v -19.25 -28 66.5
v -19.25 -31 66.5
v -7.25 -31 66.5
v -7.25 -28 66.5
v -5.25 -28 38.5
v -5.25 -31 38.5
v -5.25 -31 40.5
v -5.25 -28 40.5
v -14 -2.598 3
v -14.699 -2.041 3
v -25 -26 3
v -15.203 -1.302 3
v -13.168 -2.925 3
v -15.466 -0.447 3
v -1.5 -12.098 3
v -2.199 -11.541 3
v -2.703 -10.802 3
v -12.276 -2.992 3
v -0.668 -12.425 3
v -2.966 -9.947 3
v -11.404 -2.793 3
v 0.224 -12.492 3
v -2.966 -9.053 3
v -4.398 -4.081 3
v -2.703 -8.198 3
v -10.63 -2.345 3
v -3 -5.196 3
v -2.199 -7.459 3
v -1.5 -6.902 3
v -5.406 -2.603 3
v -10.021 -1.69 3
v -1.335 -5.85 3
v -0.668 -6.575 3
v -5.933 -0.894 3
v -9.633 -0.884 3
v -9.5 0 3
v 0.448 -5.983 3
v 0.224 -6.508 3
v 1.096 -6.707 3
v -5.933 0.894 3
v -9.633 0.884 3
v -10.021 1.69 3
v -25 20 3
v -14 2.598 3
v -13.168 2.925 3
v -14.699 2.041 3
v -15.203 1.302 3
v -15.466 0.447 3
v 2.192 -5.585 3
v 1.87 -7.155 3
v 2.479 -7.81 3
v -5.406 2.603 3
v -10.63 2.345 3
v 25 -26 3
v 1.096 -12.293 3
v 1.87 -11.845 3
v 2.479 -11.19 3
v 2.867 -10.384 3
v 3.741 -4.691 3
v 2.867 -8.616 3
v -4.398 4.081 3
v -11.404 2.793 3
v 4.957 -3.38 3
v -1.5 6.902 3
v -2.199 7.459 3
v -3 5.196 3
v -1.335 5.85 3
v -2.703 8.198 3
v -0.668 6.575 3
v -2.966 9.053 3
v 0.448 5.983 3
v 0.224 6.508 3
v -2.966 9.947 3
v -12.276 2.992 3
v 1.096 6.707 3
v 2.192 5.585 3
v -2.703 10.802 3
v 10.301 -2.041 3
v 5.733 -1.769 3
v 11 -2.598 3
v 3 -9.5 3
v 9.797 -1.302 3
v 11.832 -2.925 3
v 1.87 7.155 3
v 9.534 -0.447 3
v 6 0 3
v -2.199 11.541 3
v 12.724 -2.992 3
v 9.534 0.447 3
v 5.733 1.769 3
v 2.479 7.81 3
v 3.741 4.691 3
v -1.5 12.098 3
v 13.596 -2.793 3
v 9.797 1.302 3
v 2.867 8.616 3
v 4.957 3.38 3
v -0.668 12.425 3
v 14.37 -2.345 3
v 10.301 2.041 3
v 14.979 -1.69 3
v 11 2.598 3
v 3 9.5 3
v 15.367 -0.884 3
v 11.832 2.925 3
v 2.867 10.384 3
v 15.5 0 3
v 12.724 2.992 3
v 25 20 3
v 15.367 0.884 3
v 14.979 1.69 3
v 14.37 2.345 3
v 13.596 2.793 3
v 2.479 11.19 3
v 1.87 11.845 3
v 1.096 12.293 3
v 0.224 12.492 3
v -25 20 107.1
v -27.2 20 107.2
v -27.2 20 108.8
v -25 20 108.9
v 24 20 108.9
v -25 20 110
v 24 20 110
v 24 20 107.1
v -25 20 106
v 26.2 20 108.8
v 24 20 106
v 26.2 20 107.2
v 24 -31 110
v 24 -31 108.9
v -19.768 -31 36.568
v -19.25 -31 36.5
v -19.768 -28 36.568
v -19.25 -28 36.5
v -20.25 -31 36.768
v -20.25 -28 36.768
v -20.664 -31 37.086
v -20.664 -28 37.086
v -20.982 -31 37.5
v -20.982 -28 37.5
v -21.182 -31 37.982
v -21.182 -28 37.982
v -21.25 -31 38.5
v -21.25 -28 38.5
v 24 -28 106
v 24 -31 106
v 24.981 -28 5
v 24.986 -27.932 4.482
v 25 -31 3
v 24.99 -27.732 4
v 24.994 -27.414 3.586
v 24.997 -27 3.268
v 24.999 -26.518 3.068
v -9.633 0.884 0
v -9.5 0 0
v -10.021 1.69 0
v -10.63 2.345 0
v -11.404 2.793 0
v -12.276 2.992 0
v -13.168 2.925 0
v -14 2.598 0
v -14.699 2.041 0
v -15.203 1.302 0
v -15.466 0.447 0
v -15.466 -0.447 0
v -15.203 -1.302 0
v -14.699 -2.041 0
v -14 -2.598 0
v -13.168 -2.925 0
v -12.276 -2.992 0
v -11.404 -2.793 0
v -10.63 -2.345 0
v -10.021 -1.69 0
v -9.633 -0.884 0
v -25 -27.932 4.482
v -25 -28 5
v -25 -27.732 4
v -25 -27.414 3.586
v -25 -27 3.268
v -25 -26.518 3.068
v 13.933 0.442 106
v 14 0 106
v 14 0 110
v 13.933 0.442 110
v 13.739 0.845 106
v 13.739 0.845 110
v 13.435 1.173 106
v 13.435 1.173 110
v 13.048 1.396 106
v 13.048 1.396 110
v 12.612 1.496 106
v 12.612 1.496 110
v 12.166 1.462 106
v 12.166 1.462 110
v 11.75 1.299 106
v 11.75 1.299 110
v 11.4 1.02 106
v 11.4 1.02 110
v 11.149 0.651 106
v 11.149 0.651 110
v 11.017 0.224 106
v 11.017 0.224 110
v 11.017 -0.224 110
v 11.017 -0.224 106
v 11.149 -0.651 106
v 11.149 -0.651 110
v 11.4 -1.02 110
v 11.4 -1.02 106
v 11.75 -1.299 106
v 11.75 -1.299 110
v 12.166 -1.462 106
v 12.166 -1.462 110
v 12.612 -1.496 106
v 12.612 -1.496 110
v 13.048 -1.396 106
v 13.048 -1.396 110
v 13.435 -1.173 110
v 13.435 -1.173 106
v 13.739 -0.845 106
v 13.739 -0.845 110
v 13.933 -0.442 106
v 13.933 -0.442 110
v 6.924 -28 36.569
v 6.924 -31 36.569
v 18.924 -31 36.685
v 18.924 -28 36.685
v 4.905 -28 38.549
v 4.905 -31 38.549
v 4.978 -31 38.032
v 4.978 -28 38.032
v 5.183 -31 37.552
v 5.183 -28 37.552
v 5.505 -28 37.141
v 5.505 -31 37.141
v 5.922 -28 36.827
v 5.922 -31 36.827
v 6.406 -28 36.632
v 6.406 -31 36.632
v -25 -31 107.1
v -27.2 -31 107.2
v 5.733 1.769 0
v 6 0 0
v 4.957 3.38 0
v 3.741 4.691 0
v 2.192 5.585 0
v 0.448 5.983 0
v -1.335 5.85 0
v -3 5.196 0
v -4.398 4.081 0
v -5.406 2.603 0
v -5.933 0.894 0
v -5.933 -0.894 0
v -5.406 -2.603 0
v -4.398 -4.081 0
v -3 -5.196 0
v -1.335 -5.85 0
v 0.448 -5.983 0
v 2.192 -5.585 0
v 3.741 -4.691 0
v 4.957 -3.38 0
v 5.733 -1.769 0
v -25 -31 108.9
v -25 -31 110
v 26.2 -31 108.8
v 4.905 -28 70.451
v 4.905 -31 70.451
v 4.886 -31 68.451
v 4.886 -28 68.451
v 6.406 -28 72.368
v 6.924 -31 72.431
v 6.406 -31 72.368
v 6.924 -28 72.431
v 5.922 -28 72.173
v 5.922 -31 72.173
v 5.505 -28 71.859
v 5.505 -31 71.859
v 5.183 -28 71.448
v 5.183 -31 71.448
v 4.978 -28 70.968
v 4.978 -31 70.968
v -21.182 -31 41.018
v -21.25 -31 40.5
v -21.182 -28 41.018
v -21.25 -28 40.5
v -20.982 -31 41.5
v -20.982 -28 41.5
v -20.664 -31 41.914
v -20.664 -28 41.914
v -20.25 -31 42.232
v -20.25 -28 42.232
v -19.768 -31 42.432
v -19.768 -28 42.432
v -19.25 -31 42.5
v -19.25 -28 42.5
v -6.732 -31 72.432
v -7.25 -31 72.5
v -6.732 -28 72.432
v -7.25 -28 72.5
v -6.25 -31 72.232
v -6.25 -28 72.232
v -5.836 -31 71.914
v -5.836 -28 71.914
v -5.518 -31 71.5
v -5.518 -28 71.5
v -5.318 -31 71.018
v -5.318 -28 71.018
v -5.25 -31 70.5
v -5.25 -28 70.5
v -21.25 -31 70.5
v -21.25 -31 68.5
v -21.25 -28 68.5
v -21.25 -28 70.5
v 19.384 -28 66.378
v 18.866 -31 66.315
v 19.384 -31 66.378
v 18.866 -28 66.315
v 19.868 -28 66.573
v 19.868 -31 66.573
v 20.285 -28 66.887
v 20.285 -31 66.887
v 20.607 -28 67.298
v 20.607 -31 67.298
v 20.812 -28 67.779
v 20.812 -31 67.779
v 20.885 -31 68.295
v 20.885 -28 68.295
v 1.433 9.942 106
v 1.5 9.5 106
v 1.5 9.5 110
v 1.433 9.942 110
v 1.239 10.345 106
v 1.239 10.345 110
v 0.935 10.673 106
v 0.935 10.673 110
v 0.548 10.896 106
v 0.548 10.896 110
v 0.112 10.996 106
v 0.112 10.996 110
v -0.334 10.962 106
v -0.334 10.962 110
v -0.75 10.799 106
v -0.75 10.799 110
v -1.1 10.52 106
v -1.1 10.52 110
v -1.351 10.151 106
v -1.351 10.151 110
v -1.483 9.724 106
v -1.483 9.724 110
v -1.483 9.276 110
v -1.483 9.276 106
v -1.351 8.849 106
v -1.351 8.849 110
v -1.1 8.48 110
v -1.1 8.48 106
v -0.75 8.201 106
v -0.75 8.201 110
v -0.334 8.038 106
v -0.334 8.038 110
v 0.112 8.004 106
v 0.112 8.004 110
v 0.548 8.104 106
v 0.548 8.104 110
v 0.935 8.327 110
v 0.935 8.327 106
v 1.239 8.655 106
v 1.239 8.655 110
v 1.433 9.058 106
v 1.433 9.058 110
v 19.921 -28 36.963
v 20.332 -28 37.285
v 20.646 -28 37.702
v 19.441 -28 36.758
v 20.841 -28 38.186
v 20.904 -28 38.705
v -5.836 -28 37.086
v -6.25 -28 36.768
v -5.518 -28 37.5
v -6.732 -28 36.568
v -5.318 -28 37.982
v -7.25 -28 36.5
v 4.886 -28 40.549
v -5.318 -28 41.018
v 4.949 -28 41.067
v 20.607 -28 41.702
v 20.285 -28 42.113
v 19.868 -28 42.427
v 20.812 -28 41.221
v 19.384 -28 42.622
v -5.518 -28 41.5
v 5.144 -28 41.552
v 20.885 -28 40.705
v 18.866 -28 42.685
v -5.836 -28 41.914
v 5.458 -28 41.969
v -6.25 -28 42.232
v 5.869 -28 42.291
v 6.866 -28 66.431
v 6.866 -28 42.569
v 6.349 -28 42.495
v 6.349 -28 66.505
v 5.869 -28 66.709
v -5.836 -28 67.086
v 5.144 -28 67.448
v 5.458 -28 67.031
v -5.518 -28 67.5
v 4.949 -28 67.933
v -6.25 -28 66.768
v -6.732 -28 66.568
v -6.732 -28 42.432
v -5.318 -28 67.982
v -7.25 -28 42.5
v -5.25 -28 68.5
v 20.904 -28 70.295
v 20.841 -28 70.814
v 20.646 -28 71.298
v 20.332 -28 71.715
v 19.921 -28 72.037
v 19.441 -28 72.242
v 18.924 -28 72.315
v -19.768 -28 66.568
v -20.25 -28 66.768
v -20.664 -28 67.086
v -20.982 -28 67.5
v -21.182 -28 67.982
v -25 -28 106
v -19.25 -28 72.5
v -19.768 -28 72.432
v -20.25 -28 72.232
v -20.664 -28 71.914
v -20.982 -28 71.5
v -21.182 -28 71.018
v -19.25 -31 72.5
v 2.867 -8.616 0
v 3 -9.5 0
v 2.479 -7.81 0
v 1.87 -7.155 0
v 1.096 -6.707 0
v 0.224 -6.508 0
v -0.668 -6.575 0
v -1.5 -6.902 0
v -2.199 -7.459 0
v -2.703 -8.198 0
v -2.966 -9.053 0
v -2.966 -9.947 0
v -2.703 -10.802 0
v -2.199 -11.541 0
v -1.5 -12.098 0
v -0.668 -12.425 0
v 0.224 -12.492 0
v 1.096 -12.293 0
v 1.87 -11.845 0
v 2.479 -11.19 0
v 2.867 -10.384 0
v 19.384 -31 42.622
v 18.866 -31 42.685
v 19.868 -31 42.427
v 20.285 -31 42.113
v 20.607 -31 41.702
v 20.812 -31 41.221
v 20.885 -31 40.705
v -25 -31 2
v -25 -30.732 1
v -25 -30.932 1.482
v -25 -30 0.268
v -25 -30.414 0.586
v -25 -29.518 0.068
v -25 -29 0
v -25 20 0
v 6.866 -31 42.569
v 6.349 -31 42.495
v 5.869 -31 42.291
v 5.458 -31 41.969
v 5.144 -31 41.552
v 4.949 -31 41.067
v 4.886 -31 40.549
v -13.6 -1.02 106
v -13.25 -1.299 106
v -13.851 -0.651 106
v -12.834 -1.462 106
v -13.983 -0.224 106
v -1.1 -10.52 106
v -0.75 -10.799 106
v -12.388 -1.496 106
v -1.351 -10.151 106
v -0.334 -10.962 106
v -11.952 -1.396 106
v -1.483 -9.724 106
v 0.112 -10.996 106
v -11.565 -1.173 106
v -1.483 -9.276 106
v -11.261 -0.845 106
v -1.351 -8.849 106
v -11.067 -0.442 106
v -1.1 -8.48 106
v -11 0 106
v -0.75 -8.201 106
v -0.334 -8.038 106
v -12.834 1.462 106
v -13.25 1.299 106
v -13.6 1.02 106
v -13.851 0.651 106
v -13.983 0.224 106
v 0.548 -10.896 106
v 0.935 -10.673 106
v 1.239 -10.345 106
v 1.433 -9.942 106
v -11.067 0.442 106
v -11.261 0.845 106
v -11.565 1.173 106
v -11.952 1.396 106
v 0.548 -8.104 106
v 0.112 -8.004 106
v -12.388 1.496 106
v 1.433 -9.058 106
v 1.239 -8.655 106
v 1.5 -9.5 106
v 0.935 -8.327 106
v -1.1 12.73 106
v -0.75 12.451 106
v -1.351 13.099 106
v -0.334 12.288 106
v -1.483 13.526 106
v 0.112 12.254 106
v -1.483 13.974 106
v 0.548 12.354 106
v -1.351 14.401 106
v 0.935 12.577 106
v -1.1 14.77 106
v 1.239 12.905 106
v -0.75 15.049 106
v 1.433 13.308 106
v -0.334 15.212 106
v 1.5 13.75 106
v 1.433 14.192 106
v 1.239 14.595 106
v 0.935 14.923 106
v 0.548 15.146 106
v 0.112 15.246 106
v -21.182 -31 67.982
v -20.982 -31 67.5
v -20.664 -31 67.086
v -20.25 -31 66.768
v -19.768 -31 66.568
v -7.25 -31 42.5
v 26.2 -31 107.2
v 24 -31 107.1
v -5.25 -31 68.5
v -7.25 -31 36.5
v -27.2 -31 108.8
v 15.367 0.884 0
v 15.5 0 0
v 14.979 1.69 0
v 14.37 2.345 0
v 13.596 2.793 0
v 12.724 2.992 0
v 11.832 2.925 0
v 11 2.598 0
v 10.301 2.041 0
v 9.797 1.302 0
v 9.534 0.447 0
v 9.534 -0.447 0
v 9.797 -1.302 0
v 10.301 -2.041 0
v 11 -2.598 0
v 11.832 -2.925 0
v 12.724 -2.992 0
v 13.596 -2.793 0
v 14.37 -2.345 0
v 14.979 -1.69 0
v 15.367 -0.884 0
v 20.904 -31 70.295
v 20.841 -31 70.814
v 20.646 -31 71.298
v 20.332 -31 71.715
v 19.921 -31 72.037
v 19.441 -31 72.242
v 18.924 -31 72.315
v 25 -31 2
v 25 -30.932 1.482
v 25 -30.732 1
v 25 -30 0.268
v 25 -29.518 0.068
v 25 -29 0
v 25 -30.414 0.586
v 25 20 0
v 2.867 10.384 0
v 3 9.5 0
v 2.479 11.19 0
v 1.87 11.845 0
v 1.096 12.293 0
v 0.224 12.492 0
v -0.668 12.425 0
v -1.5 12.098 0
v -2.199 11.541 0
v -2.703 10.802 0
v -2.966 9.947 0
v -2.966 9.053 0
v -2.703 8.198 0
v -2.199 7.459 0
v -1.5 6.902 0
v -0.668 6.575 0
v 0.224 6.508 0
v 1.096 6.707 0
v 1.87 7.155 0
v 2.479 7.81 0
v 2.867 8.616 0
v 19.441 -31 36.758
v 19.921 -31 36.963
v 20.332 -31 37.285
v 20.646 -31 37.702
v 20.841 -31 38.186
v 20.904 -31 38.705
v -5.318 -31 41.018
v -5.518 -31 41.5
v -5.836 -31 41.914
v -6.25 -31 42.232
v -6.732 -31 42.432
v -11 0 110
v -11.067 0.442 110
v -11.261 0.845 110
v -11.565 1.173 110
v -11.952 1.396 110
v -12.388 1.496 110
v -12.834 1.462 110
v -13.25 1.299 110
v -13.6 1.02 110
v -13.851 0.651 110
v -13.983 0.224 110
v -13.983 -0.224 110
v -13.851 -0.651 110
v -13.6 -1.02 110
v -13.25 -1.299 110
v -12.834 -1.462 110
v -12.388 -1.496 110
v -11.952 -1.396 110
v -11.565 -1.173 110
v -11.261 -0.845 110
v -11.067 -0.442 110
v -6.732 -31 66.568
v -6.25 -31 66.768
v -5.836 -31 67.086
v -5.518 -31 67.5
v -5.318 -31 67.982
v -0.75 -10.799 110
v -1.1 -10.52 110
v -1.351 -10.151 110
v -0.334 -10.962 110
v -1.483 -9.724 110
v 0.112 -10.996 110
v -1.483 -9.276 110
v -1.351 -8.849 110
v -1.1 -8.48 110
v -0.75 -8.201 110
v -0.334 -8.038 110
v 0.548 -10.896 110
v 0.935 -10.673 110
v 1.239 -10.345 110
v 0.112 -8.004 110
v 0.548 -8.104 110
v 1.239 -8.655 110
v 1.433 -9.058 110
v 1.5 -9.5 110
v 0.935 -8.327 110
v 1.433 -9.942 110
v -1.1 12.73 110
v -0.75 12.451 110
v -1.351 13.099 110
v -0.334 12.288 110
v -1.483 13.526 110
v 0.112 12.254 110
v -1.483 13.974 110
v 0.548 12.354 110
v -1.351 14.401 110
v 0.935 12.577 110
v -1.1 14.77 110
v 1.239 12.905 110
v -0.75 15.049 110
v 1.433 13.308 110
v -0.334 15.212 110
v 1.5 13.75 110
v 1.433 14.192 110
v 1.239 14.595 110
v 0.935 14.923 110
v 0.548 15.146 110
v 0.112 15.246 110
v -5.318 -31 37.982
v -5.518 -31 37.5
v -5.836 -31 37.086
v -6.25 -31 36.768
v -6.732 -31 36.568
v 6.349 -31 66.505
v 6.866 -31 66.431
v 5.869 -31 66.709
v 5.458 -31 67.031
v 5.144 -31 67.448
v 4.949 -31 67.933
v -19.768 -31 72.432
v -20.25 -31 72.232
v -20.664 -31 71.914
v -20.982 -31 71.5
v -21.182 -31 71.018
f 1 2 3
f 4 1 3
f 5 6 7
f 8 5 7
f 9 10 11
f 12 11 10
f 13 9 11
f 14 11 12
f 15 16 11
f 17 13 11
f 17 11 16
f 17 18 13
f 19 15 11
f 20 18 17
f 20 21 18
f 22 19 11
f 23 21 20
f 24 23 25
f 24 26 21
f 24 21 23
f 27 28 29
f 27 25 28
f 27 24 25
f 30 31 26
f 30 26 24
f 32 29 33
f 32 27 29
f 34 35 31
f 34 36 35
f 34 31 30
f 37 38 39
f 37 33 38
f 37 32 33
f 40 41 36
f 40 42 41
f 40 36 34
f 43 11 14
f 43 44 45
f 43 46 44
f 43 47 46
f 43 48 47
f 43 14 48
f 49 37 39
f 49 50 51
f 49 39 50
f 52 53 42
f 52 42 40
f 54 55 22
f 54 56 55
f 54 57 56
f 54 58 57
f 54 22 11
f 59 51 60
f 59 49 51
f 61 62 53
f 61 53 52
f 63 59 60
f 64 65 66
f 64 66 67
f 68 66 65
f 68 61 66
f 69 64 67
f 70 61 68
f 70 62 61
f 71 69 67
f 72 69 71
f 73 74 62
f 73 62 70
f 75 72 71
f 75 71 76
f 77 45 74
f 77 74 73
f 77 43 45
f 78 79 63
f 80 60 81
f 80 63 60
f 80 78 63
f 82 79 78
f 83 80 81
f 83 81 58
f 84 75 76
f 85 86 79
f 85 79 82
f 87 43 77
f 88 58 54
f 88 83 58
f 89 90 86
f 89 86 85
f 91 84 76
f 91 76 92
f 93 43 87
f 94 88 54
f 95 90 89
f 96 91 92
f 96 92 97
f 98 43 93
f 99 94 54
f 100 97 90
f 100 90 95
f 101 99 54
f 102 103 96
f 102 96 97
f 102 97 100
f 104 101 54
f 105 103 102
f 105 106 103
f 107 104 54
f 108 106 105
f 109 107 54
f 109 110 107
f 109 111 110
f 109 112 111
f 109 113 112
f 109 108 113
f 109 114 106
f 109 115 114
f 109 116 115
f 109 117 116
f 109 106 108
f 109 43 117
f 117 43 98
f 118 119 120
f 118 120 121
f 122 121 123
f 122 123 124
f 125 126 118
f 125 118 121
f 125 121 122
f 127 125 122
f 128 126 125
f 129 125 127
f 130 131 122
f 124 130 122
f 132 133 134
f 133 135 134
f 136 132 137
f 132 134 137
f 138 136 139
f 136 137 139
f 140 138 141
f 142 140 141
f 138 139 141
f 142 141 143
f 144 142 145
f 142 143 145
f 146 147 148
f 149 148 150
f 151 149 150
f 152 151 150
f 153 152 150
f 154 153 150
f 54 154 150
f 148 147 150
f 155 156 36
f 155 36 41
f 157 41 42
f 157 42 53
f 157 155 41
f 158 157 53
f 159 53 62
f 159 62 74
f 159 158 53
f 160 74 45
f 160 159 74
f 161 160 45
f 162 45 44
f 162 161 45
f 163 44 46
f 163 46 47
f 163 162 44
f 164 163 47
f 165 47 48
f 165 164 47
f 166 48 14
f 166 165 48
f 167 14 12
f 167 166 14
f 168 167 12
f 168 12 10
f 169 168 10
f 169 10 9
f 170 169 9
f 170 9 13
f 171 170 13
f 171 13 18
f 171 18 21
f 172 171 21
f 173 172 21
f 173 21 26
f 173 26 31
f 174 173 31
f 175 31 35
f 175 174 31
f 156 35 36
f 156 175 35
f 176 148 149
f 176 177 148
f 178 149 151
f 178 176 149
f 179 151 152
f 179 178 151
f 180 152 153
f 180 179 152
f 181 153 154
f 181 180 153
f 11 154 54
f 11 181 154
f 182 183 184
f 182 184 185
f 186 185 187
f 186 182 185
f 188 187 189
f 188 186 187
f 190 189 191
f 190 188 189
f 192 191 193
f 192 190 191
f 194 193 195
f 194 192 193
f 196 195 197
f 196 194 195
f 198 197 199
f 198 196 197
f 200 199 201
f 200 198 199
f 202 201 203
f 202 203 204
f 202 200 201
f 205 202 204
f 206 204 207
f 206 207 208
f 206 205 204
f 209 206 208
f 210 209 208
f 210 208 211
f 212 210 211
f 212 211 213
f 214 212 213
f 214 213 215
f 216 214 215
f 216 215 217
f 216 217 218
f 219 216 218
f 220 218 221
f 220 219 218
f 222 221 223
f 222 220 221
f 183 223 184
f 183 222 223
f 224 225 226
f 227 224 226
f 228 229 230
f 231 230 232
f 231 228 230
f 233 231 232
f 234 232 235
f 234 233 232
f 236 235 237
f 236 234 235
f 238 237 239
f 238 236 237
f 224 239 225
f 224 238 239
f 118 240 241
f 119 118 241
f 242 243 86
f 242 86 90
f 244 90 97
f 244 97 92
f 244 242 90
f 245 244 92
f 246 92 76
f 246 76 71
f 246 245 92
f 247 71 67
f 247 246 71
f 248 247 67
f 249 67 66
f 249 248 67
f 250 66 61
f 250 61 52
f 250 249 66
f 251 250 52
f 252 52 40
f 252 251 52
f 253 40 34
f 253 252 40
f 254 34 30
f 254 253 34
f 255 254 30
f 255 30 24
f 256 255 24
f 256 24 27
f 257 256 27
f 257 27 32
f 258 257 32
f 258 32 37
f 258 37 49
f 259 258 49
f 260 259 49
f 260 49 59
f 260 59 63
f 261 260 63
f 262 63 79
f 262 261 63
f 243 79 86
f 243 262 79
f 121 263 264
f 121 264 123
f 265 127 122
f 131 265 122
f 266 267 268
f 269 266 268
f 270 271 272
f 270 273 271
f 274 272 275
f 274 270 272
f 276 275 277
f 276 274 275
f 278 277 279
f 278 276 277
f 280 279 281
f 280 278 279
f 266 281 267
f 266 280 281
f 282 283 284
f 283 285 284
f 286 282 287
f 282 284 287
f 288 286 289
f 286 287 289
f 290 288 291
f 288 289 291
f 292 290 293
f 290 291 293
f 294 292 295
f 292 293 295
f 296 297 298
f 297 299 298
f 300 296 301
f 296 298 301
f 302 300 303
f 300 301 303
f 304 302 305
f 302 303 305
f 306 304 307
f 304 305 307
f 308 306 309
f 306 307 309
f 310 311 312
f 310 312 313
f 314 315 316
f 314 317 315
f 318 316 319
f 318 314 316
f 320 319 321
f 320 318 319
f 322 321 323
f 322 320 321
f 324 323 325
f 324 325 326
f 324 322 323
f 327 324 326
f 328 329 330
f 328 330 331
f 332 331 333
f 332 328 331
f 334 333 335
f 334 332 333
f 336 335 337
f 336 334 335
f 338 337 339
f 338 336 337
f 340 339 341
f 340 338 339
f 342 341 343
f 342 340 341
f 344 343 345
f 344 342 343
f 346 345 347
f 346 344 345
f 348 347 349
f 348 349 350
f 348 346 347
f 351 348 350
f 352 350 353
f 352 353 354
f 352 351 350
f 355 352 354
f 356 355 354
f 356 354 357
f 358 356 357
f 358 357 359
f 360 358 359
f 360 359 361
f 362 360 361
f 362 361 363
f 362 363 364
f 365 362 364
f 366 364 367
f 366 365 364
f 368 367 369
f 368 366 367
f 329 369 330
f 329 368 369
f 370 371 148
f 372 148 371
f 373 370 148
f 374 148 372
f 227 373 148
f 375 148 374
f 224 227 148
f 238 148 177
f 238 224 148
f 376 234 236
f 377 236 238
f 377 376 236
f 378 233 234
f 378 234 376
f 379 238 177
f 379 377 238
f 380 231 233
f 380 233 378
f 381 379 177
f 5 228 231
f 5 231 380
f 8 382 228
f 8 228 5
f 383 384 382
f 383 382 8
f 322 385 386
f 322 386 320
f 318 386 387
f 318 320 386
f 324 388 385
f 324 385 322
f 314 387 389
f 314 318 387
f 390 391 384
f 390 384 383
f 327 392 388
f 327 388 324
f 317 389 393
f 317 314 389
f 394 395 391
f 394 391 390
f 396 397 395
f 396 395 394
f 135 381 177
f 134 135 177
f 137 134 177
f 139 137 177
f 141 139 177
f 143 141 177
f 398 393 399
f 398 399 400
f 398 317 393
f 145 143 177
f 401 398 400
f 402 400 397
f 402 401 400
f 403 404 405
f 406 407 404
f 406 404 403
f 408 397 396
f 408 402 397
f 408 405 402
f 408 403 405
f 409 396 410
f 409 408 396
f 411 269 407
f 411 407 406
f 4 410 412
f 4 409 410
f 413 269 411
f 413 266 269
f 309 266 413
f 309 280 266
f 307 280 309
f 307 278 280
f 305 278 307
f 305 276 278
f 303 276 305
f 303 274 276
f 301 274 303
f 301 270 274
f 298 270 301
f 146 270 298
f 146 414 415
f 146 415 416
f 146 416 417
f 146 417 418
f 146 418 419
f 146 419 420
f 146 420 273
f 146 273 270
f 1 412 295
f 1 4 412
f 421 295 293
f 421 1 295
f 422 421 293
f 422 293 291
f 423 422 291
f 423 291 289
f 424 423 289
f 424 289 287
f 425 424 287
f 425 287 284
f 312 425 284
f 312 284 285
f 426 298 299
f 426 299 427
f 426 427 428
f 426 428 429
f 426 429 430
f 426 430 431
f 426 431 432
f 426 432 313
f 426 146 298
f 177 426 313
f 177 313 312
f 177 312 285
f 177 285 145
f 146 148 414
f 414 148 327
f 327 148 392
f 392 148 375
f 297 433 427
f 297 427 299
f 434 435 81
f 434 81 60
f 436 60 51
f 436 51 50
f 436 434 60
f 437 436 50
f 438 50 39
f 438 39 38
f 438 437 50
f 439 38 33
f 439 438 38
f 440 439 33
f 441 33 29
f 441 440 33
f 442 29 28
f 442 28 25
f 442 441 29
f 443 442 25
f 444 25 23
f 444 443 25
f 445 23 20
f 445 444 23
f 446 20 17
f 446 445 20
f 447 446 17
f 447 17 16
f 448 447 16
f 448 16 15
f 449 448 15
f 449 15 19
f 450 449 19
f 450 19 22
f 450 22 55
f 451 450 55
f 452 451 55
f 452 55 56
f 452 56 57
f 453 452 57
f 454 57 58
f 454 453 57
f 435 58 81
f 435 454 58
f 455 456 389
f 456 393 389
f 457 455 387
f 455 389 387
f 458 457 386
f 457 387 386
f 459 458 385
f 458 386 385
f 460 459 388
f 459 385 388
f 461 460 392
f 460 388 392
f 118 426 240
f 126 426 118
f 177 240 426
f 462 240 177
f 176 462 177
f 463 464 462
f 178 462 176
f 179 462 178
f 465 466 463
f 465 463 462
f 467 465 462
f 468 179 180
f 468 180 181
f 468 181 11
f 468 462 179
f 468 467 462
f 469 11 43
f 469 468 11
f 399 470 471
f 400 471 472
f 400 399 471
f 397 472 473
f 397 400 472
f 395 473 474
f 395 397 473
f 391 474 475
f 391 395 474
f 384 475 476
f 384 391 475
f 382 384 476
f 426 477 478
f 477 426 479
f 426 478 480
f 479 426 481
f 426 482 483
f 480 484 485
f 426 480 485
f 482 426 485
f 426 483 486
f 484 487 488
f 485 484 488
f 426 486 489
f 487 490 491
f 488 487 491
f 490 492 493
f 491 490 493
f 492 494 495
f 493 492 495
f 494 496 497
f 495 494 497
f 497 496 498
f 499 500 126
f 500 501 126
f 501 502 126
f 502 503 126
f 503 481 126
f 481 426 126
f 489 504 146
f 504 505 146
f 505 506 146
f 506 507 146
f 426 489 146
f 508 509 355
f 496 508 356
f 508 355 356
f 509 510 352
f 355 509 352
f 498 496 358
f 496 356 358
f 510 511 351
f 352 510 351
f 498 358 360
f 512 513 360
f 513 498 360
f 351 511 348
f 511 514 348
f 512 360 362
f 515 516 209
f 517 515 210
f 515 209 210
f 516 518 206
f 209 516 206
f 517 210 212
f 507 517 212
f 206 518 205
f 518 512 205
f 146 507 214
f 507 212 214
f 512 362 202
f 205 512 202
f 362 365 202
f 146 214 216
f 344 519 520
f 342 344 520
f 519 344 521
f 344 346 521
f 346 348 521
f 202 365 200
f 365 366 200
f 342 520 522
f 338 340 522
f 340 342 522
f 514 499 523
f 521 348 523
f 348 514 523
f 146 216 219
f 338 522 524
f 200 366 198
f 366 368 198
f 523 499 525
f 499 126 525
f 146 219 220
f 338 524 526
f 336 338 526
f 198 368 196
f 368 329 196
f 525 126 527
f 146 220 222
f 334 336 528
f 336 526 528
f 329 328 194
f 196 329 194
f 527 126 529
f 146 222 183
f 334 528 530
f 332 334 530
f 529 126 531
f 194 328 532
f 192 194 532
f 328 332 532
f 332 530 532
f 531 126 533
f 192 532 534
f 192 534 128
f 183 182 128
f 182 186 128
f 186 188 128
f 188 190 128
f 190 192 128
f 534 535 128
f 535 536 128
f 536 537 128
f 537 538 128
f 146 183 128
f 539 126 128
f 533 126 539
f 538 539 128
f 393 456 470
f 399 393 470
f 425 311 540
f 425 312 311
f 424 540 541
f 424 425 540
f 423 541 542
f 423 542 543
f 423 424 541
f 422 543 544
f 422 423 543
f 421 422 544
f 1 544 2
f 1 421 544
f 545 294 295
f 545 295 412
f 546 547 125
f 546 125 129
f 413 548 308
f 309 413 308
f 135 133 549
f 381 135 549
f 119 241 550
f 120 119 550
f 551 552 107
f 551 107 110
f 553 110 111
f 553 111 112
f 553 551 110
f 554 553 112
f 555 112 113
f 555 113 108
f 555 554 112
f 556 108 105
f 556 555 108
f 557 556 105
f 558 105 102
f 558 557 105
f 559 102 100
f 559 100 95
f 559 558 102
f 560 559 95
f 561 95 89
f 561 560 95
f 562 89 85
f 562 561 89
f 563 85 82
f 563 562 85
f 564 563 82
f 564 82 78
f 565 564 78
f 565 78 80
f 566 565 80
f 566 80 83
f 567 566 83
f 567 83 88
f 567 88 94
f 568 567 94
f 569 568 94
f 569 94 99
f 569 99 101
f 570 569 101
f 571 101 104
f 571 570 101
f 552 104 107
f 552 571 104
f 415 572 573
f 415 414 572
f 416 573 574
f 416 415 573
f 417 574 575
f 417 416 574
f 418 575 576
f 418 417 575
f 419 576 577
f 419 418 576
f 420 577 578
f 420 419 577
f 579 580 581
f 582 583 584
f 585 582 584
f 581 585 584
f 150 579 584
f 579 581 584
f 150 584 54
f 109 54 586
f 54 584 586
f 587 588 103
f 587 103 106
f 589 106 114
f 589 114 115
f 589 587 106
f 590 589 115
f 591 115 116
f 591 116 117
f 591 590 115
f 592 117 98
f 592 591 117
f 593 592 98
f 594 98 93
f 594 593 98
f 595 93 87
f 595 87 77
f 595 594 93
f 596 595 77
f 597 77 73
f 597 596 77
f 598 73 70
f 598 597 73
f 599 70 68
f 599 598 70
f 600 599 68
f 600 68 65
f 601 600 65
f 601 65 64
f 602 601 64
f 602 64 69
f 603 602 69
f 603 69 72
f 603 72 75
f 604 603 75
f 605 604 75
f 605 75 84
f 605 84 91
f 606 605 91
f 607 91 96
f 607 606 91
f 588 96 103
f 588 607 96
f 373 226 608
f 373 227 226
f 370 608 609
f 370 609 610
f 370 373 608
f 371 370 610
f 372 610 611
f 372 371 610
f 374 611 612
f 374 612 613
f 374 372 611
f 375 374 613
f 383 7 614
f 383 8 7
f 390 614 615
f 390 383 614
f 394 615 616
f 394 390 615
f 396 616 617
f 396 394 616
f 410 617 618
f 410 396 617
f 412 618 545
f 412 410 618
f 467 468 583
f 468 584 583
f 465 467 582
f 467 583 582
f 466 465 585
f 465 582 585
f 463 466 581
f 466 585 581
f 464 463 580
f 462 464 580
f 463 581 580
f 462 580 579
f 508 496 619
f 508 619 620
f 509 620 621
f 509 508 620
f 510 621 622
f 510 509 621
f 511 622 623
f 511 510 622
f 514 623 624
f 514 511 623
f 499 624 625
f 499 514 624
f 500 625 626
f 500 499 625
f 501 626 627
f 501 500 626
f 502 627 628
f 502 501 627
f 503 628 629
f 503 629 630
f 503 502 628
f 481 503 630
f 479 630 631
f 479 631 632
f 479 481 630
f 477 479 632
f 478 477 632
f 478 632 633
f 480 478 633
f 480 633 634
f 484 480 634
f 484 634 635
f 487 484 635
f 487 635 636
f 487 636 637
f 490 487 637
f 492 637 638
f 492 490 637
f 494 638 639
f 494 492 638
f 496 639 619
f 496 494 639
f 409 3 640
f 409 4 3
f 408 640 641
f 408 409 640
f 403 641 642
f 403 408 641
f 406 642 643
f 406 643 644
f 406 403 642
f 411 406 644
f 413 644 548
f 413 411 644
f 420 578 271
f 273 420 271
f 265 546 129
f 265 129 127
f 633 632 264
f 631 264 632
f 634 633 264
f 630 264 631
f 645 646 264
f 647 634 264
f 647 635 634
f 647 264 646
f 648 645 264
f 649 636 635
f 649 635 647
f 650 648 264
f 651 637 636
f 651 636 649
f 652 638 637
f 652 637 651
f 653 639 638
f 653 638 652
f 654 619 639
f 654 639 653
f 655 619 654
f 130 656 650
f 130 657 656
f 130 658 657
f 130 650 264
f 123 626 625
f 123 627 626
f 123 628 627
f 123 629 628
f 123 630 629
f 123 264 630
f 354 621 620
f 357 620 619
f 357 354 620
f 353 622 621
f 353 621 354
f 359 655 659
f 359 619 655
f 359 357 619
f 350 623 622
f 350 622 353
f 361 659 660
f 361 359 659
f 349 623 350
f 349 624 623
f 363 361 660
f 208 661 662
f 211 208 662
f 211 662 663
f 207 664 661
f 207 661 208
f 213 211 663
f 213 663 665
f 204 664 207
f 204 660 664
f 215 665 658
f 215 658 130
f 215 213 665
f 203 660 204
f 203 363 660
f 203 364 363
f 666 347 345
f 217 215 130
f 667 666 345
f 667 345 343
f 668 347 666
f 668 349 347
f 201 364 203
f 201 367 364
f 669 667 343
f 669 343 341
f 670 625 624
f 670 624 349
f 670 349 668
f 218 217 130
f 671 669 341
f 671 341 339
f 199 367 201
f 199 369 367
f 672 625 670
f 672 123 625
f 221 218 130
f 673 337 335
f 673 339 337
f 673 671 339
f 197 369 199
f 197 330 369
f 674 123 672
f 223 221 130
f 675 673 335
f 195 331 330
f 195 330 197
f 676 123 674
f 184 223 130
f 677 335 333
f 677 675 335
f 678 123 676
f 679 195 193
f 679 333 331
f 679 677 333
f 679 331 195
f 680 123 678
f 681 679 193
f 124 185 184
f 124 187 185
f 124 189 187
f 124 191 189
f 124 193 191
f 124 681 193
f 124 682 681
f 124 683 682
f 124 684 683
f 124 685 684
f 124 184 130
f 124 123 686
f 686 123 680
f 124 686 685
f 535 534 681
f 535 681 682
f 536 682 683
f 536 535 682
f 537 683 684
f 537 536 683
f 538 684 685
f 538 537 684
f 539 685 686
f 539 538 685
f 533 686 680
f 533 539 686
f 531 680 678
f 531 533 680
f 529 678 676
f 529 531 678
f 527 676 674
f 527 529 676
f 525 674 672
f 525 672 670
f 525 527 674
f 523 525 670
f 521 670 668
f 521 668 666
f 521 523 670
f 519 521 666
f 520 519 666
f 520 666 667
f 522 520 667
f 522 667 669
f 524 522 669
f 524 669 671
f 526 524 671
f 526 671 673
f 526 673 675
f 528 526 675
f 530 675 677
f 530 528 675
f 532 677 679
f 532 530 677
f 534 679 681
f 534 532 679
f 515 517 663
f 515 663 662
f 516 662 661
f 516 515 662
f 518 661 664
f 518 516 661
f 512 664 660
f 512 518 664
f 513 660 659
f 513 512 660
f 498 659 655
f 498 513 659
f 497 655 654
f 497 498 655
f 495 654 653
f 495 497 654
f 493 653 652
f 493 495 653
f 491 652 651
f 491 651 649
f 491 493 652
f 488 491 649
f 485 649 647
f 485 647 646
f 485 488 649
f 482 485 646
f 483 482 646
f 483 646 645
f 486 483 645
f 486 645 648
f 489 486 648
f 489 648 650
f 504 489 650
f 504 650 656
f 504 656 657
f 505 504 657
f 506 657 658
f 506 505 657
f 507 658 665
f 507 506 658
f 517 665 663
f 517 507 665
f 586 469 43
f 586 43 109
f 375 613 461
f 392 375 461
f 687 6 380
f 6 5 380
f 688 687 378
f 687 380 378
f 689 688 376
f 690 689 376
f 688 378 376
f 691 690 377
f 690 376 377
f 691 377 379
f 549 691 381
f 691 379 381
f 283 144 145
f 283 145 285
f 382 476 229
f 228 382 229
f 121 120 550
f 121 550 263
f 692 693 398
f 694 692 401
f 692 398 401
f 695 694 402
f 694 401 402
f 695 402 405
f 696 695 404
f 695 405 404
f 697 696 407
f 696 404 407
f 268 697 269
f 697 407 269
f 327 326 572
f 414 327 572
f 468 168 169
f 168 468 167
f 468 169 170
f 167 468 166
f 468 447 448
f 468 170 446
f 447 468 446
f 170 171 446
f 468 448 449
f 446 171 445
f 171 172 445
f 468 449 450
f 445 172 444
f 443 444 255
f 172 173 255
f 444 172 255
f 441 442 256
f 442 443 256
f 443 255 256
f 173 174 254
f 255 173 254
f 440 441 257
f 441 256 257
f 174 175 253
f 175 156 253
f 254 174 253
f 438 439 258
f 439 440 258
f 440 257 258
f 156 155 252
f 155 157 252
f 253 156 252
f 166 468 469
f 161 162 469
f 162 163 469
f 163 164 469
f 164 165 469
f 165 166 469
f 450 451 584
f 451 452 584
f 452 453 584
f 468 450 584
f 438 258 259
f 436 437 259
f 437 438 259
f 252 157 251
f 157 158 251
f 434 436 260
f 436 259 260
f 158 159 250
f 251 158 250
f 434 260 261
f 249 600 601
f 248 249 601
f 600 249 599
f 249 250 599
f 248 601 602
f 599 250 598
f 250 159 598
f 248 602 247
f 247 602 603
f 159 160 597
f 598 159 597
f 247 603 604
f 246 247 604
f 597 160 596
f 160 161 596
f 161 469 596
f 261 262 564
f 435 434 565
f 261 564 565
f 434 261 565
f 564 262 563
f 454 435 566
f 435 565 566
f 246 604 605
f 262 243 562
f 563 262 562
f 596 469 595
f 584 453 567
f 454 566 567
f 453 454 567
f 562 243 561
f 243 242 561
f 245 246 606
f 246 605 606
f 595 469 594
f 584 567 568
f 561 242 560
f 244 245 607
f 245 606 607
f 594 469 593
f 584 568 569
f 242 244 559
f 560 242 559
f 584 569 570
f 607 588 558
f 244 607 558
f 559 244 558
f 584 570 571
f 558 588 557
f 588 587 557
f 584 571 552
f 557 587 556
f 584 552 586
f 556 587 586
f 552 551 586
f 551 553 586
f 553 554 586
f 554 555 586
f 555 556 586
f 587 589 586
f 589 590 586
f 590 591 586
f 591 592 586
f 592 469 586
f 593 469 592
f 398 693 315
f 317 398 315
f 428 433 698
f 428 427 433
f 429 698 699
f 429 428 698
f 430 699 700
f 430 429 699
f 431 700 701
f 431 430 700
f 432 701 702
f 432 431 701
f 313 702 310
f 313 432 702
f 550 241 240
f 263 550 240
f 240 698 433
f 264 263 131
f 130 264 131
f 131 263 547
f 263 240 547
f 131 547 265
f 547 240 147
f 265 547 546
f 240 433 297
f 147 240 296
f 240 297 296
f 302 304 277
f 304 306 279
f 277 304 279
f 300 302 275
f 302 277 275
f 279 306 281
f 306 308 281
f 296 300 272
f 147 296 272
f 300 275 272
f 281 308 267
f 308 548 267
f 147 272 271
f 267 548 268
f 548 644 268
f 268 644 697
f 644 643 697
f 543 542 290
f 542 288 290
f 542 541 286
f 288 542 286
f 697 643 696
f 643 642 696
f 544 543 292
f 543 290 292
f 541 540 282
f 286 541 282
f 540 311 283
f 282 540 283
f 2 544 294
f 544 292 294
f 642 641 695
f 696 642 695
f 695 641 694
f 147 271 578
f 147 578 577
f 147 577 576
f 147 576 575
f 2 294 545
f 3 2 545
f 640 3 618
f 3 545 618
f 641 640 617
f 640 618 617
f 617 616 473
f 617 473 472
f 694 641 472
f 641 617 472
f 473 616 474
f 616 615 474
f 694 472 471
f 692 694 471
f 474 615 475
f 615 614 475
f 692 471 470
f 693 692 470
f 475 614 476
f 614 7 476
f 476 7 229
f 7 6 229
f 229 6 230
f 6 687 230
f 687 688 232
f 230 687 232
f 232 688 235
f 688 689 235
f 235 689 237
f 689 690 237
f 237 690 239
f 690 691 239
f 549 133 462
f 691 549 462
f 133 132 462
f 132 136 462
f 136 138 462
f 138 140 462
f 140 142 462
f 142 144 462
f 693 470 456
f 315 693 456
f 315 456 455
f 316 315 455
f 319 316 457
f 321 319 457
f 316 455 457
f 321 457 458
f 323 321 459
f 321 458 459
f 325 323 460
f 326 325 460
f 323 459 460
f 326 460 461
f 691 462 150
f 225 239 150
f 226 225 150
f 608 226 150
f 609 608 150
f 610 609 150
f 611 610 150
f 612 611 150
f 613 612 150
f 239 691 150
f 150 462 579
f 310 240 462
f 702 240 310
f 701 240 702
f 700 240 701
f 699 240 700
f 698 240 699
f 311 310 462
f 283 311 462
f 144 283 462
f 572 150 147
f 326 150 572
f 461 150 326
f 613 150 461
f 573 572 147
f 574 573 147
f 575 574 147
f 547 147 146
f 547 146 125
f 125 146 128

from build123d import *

# Parameters (mm, degrees)
SKETCH_1_W      = 50
SKETCH_1_H      = 51
SKETCH_1_R      = 6
SKETCH_1_R_2    = 3
EXTRUDE_1_DEPTH = 3
SKETCH_2_W      = 16
SKETCH_2_H      = 6
EXTRUDE_2_DEPTH = 3
SKETCH_3_W      = 49
SKETCH_3_H      = 51
SKETCH_3_R      = 1.5
EXTRUDE_3_DEPTH = 4
FILLET_2_R      = 2
FILLET_3_R      = 2
FILLET_4_R      = 2
FILLET_5_R      = 2
FILLET_6_R      = 2
EXTRUDE_5_DEPTH = 51


with BuildPart() as part:
    # 草图1 → 凸台-拉伸1 (new body)
    with BuildSketch(Plane.XY):
        with Locations((0, -5.5)):
            Rectangle(SKETCH_1_W, SKETCH_1_H)
        Circle(SKETCH_1_R, mode=Mode.SUBTRACT)
        with Locations((12.5, 0)):
            Circle(SKETCH_1_R_2, mode=Mode.SUBTRACT)
        with Locations((-12.5, 0)):
            Circle(SKETCH_1_R_2, mode=Mode.SUBTRACT)
        with Locations((0, 9.5)):
            Circle(SKETCH_1_R_2, mode=Mode.SUBTRACT)
        with Locations((0, -9.5)):
            Circle(SKETCH_1_R_2, mode=Mode.SUBTRACT)
    extrude(amount=EXTRUDE_1_DEPTH)

    # 草图2 → 凸台-拉伸2 (add)
    with BuildSketch(Plane.XZ.offset(31)):
        Polygon((-25, 3), (-25, 106), (24, 106), (25, 3), align=None)
        with Locations((-13.25, 39.5)):
            Rectangle(SKETCH_2_W, SKETCH_2_H, mode=Mode.SUBTRACT)
        Polygon((4.866266466, 42.54910809), (4.92451752, 36.549390862), (20.923763461, 36.704727007), (20.865512407, 42.704444235), align=None, mode=Mode.SUBTRACT)
        with Locations((-13.25, 69.5)):
            Rectangle(SKETCH_2_W, SKETCH_2_H, mode=Mode.SUBTRACT)
        Polygon((20.865512407, 66.295555765), (20.923763461, 72.295272993), (4.92451752, 72.450609138), (4.866266466, 66.45089191), align=None, mode=Mode.SUBTRACT)
    extrude(amount=-EXTRUDE_2_DEPTH)

    # 草图3 → 凸台-拉伸3 (add)
    with BuildSketch(Plane.XY.offset(106)):
        with Locations((-0.5, -5.5)):
            Rectangle(SKETCH_3_W, SKETCH_3_H)
        with Locations((-12.5, 0)):
            Circle(SKETCH_3_R, mode=Mode.SUBTRACT)
        with Locations((12.5, 0)):
            Circle(SKETCH_3_R, mode=Mode.SUBTRACT)
        with Locations((0, -9.5)):
            Circle(SKETCH_3_R, mode=Mode.SUBTRACT)
        with Locations((0, 9.5)):
            Circle(SKETCH_3_R, mode=Mode.SUBTRACT)
        with Locations((0, 13.75)):
            Circle(SKETCH_3_R, mode=Mode.SUBTRACT)
    extrude(amount=EXTRUDE_3_DEPTH)

    # 圆角2
    fillet_2_edges = [part.edges().sort_by_distance(p)[0] for p in [
        (-5.25, -29.5, 36.5),
    ]]
    fillet(fillet_2_edges, radius=FILLET_2_R)

    # 圆角3
    fillet_3_edges = [part.edges().sort_by_distance(p)[0] for p in [
        (-21.25, -29.5, 36.5),
        (-21.25, -29.5, 42.5),
        (-5.25, -29.5, 42.5),
    ]]
    fillet(fillet_3_edges, radius=FILLET_3_R)

    # 圆角4
    fillet_4_edges = [part.edges().sort_by_distance(p)[0] for p in [
        (20.865512407, -29.5, 42.704444235),
        (20.923763461, -29.5, 36.704727007),
        (4.92451752, -29.5, 36.549390862),
        (4.866266466, -29.5, 42.54910809),
        (-21.25, -29.5, 66.5),
        (-21.25, -29.5, 72.5),
        (-5.25, -29.5, 72.5),
        (-5.25, -29.5, 66.5),
        (4.866266466, -29.5, 66.45089191),
        (4.92451752, -29.5, 72.450609138),
        (20.923763461, -29.5, 72.295272993),
        (20.865512407, -29.5, 66.295555765),
    ]]
    fillet(fillet_4_edges, radius=FILLET_4_R)

    # 圆角5
    fillet_5_edges = [part.edges().sort_by_distance(p)[0] for p in [
        (0, -28, 3),
    ]]
    fillet(fillet_5_edges, radius=FILLET_5_R)

    # 圆角6
    fillet_6_edges = [part.edges().sort_by_distance(p)[0] for p in [
        (0, -31, 0),
    ]]
    fillet(fillet_6_edges, radius=FILLET_6_R)

    # 草图6 → 凸台-拉伸5 (add)
    with BuildSketch(Plane(origin=(0, -31, 0), x_dir=(-1, 0, 0), z_dir=(0, -1, 0))):
        Polygon((-24, -108.9), (-23.989320388, -107.1), (-26.2, -107.2), (-26.2, -108.8), align=None)
        Polygon((25, -108.9), (24.989320388, -107.1), (27.2, -107.2), (27.2, -108.8), align=None)
    extrude(amount=-EXTRUDE_5_DEPTH)


solid = part.part
